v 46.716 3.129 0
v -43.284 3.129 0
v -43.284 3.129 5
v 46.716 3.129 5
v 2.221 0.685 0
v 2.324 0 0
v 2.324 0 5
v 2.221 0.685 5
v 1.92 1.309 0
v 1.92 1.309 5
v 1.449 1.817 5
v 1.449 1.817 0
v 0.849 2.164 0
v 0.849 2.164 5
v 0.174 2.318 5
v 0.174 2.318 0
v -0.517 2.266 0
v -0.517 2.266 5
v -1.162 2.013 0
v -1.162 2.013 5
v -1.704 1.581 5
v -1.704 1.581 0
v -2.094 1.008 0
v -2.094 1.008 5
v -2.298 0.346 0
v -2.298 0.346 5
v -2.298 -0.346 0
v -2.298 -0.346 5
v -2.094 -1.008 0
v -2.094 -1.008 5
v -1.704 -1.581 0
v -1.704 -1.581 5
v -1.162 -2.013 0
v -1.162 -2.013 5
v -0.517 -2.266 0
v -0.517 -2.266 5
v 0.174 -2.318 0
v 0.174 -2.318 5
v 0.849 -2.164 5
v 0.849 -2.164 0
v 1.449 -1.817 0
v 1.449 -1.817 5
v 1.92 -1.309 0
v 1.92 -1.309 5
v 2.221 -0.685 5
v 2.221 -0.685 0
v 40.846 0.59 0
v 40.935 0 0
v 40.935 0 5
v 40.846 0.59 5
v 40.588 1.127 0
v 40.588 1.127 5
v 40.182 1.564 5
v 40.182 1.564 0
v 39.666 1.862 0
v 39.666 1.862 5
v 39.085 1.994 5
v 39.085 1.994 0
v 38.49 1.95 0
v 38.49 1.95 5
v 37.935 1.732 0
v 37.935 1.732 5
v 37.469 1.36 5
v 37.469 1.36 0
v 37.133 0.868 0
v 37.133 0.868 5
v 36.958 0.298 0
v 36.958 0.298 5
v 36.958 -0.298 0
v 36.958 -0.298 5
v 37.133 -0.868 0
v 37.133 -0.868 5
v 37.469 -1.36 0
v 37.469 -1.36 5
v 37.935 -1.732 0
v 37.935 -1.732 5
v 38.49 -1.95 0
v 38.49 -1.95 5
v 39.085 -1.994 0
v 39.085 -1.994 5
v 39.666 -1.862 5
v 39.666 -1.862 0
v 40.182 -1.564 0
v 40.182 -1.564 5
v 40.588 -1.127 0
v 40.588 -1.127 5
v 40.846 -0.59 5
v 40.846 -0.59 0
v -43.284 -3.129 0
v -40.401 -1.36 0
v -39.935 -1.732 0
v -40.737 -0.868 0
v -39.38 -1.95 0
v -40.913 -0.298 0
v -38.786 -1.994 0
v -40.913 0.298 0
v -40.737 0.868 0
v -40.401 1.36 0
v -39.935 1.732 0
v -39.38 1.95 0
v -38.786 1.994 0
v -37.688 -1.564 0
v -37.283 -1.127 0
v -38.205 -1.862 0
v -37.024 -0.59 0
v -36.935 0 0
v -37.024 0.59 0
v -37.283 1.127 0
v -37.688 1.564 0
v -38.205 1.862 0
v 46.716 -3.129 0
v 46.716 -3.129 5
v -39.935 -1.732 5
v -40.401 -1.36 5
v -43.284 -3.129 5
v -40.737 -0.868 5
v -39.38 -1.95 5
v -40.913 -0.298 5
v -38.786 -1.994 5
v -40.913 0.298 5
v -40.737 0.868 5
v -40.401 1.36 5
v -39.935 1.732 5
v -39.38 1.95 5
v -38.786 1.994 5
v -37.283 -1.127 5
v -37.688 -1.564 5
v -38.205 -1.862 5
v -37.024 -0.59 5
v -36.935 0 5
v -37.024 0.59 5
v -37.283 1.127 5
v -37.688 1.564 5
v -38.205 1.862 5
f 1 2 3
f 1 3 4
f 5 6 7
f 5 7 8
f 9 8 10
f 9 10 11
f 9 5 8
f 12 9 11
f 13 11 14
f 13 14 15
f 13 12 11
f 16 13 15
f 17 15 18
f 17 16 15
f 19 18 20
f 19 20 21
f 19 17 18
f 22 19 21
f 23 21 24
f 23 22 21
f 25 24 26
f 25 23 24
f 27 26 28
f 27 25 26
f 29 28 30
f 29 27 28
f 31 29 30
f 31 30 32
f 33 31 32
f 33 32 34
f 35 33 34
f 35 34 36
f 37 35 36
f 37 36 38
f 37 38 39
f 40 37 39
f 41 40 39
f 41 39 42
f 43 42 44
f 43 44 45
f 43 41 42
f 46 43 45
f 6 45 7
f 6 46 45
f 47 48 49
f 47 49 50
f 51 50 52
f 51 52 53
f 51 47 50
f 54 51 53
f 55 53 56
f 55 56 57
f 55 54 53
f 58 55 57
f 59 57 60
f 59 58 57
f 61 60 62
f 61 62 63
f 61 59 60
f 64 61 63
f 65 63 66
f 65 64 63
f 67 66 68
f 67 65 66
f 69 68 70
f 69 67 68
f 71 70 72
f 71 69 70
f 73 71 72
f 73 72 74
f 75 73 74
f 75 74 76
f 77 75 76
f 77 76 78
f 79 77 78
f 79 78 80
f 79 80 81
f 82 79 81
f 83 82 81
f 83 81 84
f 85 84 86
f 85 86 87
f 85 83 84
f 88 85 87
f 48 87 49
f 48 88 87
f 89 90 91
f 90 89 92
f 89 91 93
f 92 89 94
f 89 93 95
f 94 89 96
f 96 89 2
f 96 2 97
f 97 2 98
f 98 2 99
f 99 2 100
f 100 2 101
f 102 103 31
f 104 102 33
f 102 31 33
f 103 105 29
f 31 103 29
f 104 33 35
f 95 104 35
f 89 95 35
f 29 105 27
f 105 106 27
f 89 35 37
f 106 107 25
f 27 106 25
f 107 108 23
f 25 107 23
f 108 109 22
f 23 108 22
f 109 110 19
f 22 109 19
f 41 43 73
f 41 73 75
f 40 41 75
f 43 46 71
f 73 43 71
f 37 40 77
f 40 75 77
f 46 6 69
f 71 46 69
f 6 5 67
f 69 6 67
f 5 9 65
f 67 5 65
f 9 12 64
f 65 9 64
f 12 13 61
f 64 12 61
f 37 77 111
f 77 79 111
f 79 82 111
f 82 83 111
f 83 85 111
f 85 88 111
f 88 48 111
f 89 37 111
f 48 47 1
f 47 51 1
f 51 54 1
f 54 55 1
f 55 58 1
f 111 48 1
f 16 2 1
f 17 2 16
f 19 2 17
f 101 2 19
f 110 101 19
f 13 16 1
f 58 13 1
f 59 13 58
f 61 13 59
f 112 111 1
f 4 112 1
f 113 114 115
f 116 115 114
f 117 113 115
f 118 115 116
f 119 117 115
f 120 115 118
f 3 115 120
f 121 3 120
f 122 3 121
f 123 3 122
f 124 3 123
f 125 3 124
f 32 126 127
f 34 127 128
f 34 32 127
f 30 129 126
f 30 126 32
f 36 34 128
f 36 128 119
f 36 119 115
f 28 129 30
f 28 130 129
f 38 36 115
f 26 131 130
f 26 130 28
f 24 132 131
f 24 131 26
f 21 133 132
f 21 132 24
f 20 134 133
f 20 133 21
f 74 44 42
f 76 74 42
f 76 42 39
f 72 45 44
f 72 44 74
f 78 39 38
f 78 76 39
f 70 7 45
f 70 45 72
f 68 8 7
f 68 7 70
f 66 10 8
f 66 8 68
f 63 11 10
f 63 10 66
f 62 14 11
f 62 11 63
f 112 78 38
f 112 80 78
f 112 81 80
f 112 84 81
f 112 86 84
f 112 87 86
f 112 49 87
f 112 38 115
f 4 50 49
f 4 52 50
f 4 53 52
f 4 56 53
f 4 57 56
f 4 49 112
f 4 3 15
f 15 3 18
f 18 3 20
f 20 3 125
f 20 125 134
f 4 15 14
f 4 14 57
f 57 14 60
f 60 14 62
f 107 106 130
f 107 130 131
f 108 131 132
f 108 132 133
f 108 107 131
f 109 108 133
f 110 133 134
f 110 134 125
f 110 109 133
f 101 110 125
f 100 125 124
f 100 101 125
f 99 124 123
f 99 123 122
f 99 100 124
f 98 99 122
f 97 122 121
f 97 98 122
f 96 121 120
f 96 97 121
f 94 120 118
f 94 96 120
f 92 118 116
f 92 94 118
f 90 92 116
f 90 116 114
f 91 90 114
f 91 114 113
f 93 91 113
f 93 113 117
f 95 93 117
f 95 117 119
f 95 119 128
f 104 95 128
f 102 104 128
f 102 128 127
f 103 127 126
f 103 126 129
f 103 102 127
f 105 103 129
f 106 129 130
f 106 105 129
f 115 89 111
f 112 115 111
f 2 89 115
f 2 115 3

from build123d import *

# Parameters (mm, degrees)
F0_W     = 90
F0_H     = 6.258672
F0_R     = 2
F0_R_2   = 2.324227
F1_DEPTH = 5


with BuildPart() as f1:
    # F0 (on Top) → F1 (new body)
    with BuildSketch(Plane.XY):
        with Locations((1.716086, 0)):
            Rectangle(F0_W, F0_H)
        with Locations((-38.935287, 0)):
            Circle(F0_R, mode=Mode.SUBTRACT)
        Circle(F0_R_2, mode=Mode.SUBTRACT)
        with Locations((38.935287, 0)):
            Circle(F0_R, mode=Mode.SUBTRACT)
    extrude(amount=F1_DEPTH)


solid = f1.part
